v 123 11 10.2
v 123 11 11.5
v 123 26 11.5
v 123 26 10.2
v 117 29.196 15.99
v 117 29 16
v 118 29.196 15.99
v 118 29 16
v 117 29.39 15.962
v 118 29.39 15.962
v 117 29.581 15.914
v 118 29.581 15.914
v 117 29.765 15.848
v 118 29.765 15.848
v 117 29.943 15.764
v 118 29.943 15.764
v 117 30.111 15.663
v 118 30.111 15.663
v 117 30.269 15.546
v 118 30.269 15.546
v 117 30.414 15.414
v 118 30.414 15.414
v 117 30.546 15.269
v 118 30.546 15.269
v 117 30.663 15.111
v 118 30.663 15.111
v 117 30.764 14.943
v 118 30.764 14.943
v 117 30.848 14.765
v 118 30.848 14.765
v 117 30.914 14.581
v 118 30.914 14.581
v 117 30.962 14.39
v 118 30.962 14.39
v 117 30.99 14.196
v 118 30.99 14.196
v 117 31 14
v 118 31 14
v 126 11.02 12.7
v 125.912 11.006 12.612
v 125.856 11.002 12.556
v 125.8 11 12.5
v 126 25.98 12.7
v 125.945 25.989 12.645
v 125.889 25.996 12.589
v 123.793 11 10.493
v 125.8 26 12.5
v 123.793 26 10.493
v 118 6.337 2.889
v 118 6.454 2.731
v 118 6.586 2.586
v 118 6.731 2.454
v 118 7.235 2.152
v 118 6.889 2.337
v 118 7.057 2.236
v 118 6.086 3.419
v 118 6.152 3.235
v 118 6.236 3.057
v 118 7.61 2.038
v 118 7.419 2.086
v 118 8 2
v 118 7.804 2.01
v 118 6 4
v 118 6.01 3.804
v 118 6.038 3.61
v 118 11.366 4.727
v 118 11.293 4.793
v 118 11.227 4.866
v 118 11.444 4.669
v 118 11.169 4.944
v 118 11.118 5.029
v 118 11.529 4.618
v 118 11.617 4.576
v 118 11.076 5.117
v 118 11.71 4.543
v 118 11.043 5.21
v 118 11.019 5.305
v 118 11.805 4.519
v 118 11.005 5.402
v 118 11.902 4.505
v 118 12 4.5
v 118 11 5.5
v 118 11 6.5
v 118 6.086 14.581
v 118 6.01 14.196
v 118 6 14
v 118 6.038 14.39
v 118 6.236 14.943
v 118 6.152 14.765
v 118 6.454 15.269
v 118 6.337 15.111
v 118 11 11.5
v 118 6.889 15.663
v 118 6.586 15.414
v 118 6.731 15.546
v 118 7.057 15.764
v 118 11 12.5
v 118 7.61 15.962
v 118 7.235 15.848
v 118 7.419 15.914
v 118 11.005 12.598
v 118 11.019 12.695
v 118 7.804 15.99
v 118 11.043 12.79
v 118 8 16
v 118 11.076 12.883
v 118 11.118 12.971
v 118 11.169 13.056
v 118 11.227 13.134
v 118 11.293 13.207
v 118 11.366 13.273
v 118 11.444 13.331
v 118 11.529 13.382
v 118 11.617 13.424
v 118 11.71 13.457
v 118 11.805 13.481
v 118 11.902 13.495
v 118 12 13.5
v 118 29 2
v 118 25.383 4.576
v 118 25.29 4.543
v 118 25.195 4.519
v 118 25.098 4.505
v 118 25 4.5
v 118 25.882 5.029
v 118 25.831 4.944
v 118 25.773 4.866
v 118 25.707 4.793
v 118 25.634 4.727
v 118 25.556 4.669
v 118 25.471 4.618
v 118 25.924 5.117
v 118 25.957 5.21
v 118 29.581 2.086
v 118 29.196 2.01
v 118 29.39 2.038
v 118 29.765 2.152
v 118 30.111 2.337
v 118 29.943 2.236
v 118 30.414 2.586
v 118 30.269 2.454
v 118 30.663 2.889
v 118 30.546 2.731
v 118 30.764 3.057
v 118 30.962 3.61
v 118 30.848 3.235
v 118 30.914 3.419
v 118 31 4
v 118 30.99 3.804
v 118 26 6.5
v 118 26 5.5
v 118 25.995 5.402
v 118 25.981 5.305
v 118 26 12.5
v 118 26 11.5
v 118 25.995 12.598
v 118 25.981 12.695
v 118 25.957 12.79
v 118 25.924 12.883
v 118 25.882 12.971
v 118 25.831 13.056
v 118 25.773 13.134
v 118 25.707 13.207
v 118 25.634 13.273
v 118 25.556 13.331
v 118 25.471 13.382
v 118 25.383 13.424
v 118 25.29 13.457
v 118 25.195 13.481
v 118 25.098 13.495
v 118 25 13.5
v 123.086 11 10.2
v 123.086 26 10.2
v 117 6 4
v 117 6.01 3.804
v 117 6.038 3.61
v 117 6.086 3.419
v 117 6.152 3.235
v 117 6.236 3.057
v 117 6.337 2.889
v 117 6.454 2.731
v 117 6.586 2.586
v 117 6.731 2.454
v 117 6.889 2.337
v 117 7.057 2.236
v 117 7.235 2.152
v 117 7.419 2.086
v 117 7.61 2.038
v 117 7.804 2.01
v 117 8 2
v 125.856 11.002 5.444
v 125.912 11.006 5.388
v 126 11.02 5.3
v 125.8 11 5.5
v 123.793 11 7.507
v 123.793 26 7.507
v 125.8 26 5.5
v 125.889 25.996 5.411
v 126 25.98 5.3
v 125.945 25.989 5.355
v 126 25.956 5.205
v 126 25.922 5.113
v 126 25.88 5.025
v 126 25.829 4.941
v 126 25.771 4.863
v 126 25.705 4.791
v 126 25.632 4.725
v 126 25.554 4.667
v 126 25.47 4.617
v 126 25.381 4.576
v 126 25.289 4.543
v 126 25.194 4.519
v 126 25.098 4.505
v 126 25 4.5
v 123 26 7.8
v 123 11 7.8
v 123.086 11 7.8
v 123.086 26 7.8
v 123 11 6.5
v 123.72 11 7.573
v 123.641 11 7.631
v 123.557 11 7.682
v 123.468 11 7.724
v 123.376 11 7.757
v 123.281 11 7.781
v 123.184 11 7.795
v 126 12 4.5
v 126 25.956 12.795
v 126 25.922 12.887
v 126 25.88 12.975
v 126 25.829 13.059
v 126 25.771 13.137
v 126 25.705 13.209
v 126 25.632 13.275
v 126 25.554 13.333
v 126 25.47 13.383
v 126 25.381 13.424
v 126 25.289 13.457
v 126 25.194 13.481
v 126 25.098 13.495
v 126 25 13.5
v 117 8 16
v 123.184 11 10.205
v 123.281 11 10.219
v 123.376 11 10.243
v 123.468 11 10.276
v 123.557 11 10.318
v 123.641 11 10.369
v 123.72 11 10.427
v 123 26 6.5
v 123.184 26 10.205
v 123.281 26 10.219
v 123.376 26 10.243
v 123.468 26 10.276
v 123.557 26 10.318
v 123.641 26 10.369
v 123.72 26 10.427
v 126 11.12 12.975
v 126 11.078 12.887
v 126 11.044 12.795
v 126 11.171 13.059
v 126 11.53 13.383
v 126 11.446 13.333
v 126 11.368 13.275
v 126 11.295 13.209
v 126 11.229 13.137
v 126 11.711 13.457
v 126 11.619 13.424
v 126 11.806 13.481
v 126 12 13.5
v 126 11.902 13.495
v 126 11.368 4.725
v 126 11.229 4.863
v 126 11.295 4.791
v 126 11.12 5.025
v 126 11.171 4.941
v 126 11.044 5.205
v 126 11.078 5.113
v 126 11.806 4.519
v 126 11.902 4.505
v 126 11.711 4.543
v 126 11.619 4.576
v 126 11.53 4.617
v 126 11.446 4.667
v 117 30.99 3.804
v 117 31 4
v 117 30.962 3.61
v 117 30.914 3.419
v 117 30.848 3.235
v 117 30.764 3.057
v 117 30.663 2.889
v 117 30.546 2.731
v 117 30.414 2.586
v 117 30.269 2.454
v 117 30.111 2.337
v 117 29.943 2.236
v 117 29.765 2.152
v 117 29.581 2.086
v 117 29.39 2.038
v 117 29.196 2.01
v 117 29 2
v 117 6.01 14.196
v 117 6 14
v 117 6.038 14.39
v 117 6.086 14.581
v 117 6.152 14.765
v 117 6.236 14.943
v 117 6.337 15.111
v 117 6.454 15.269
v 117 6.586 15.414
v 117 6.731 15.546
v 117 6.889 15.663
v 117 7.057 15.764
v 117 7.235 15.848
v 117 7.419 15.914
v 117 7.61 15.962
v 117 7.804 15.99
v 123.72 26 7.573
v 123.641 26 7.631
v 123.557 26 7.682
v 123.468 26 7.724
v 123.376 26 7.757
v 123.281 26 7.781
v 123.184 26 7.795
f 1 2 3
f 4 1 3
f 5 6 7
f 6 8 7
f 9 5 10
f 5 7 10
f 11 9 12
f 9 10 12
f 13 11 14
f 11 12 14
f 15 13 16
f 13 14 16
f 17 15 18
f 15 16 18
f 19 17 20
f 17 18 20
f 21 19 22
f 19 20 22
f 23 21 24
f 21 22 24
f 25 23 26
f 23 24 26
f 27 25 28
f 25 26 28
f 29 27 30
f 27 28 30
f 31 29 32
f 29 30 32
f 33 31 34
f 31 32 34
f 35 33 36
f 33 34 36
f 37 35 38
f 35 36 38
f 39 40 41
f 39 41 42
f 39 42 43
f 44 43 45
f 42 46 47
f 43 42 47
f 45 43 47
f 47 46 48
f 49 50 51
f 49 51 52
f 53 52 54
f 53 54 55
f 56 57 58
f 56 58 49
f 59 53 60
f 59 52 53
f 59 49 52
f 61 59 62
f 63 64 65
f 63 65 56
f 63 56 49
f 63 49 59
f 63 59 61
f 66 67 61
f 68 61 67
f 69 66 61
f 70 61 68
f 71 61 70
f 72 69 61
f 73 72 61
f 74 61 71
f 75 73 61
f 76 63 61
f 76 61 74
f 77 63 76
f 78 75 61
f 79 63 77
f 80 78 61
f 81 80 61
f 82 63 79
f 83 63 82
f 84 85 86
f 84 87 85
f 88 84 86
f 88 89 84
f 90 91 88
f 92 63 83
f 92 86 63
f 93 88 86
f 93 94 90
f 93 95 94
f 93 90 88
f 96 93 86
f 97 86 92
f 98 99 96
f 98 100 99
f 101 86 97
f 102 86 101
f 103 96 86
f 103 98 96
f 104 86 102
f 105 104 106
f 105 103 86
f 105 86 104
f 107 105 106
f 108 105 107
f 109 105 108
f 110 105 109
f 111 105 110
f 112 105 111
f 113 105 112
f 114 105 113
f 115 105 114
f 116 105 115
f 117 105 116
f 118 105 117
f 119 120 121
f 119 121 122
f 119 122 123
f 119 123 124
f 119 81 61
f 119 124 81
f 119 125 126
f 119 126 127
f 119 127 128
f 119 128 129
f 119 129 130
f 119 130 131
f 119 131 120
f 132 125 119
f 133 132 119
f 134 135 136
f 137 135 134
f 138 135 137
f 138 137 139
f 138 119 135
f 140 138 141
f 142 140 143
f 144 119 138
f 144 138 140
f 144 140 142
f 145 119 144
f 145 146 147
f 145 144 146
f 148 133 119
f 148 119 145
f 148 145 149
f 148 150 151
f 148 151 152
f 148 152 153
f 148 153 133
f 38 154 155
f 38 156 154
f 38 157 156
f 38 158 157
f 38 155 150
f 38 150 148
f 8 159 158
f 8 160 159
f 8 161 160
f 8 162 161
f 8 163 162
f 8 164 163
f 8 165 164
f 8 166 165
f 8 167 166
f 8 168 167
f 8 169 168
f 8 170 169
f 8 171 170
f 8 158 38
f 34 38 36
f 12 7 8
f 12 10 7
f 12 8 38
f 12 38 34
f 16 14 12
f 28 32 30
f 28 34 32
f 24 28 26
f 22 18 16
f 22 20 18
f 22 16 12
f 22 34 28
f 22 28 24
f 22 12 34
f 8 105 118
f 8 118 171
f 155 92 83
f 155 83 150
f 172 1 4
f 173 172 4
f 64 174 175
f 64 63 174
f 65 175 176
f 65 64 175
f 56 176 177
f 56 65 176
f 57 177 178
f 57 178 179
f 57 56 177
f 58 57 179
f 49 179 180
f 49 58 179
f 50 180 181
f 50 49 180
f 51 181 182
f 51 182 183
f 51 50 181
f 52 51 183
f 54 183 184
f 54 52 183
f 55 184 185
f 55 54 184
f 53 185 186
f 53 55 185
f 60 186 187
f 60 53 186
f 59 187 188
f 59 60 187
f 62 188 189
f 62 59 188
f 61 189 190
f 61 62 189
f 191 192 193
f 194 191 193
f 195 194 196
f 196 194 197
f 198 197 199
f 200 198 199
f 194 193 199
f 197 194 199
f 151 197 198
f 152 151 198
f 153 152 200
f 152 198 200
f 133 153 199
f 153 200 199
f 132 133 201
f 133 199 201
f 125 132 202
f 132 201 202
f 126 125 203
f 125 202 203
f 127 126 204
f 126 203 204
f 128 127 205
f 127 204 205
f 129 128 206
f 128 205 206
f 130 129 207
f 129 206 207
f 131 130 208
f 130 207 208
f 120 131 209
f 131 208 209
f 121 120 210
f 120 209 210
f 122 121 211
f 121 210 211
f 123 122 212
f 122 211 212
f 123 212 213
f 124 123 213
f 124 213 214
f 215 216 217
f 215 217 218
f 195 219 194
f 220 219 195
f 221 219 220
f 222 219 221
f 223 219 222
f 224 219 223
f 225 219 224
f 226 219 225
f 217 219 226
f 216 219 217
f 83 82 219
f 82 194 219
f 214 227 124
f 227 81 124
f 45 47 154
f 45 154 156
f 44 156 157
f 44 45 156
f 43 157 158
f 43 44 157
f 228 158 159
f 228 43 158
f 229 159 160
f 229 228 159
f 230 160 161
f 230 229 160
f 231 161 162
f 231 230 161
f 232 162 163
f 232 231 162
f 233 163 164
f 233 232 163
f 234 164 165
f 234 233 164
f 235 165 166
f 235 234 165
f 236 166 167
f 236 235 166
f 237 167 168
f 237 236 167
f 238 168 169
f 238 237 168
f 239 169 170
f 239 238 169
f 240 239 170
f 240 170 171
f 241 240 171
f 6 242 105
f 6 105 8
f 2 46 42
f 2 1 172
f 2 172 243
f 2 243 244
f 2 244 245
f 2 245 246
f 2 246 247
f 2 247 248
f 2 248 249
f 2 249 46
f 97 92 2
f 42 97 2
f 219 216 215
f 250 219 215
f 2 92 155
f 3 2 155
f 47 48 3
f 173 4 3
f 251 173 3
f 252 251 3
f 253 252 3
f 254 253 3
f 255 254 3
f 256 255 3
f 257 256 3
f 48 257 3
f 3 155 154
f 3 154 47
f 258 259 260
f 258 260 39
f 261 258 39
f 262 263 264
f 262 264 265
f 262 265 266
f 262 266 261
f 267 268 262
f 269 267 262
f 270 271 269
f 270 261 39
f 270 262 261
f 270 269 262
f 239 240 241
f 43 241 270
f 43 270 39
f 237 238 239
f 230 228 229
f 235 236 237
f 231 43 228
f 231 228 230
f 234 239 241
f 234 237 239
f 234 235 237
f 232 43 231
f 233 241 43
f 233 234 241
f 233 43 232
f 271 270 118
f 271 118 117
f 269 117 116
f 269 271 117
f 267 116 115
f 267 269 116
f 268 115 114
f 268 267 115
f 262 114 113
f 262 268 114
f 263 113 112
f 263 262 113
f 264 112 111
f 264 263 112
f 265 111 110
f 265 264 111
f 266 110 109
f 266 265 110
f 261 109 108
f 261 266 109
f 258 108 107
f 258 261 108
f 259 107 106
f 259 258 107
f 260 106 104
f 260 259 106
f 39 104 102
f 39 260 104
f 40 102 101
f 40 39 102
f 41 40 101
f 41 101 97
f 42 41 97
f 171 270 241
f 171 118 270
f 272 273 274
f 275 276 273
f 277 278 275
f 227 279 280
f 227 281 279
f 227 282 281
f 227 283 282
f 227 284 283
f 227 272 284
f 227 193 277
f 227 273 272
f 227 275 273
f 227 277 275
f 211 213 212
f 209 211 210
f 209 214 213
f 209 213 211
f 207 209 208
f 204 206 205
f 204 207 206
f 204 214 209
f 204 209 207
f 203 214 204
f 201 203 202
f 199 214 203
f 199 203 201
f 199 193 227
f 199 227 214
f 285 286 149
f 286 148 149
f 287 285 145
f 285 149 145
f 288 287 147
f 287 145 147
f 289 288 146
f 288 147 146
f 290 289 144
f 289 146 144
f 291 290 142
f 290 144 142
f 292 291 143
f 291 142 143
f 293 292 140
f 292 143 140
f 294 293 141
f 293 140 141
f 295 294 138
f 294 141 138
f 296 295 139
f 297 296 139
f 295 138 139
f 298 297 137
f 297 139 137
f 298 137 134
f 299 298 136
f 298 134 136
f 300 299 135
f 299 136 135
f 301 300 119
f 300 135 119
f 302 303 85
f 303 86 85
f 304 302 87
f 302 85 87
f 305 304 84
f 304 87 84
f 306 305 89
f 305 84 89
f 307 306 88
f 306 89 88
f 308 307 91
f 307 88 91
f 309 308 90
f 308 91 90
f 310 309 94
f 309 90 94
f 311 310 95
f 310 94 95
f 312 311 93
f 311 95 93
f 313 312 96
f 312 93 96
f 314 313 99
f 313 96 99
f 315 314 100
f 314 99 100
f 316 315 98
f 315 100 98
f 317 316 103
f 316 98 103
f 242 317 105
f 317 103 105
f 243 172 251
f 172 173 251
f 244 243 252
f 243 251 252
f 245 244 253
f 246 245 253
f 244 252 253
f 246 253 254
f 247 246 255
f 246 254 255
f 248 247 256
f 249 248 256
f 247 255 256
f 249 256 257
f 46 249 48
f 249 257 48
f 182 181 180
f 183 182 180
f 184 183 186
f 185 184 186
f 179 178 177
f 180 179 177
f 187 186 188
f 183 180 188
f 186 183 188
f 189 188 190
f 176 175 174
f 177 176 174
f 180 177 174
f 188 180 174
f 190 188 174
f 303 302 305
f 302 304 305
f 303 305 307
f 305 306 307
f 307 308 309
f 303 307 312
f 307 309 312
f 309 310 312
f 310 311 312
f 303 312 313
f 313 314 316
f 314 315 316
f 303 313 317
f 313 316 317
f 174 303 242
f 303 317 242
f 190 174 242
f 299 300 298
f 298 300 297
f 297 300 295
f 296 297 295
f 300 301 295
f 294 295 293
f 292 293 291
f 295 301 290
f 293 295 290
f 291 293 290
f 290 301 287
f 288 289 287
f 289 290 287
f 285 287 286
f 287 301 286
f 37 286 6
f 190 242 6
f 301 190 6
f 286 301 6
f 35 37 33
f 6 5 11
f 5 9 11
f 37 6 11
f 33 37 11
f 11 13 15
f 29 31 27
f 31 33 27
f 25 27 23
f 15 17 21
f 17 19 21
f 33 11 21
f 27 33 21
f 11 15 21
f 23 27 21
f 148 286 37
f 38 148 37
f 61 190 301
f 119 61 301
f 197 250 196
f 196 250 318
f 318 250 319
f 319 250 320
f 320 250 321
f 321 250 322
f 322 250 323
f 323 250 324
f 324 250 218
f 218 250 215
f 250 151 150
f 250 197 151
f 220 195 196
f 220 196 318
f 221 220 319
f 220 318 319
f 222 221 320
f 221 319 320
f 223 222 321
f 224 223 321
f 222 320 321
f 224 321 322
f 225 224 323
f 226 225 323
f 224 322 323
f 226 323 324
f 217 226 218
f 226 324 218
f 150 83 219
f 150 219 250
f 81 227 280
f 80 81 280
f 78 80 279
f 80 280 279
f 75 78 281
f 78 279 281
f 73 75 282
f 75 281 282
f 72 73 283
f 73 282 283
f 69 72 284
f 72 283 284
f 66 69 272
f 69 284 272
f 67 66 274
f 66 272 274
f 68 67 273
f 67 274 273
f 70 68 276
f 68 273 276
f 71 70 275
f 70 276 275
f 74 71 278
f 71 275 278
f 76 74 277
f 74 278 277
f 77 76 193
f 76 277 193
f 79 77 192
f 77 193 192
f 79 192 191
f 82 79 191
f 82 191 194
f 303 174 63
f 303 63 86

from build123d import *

# Parameters (mm, degrees)
SKETCH007_W  = 25
SKETCH007_H  = 14
PAD003_DEPTH = 1
FILLET002_R  = 2
FILLET003_R  = 2
FILLET004_R  = 2
FILLET005_R  = 2
SKETCH008_W  = 15
SKETCH008_H  = 2
PAD004_DEPTH = 5
SKETCH009_W  = 15
SKETCH009_H  = 3.3
PAD005_DEPTH = 3
CHAMFER_SIZE = 2.5
FILLET006_R  = 1
FILLET007_R  = 1
FILLET008_R  = 1


with BuildPart() as part:
    # Sketch007 → Pad003 (new body)
    with BuildSketch(Plane.YZ):
        with Locations((-12.5, 9)):
            Rectangle(SKETCH007_W, SKETCH007_H)
    extrude(amount=PAD003_DEPTH)

    # Fillet002
    fillet002_edges = [part.edges().sort_by_distance(p)[0] for p in [
        (0.5, -25, 2),
    ]]
    fillet(fillet002_edges, radius=FILLET002_R)

    # Fillet003
    fillet003_edges = [part.edges().sort_by_distance(p)[0] for p in [
        (0.5, -25, 16),
    ]]
    fillet(fillet003_edges, radius=FILLET003_R)

    # Fillet004
    fillet004_edges = [part.edges().sort_by_distance(p)[0] for p in [
        (0.5, 0, 16),
    ]]
    fillet(fillet004_edges, radius=FILLET004_R)

    # Fillet005
    fillet005_edges = [part.edges().sort_by_distance(p)[0] for p in [
        (0.5, 0, 2),
    ]]
    fillet(fillet005_edges, radius=FILLET005_R)

    # Sketch008 (on Face10 of Fillet005) → Pad004 (join)
    with BuildSketch(Plane.YZ.offset(1)):
        with Locations((-12.5, 12.5)):
            Rectangle(SKETCH008_W, SKETCH008_H)
        with Locations((-12.5, 5.5)):
            Rectangle(SKETCH008_W, SKETCH008_H)
    extrude(amount=PAD004_DEPTH)

    # Sketch009 (on Face20 of Pad004) → Pad005 (join)
    with BuildSketch(Plane.YZ.offset(6)):
        with Locations((-12.5, 6.15)):
            Rectangle(SKETCH009_W, SKETCH009_H)
        with Locations((-12.5, 11.85)):
            Rectangle(SKETCH009_W, SKETCH009_H)
    extrude(amount=PAD005_DEPTH)

    # Chamfer
    chamfer_edges = [part.edges().sort_by_distance(p)[0] for p in [
        (9, -12.5, 7.8),
        (9, -12.5, 10.2),
    ]]
    chamfer(chamfer_edges, length=CHAMFER_SIZE)

    # Fillet006
    fillet006_edges = [part.edges().sort_by_distance(p)[0] for p in [
        (6.5, -12.5, 10.2),
    ]]
    fillet(fillet006_edges, radius=FILLET006_R)

    # Fillet007
    fillet007_edges = [part.edges().sort_by_distance(p)[0] for p in [
        (6.5, -12.5, 7.8),
    ]]
    fillet(fillet007_edges, radius=FILLET007_R)

    # Fillet008
    fillet008_edges = [part.edges().sort_by_distance(p)[0] for p in [
        (3.5, -20, 4.5),
        (3.5, -20, 13.5),
        (3.5, -5, 13.5),
        (3.5, -5, 4.5),
    ]]
    fillet(fillet008_edges, radius=FILLET008_R)


with BuildPart() as part_1:
    # Body002 placement: moved
    add(part.part.moved(Location((117, 31, 0))))


solid = part_1.part
